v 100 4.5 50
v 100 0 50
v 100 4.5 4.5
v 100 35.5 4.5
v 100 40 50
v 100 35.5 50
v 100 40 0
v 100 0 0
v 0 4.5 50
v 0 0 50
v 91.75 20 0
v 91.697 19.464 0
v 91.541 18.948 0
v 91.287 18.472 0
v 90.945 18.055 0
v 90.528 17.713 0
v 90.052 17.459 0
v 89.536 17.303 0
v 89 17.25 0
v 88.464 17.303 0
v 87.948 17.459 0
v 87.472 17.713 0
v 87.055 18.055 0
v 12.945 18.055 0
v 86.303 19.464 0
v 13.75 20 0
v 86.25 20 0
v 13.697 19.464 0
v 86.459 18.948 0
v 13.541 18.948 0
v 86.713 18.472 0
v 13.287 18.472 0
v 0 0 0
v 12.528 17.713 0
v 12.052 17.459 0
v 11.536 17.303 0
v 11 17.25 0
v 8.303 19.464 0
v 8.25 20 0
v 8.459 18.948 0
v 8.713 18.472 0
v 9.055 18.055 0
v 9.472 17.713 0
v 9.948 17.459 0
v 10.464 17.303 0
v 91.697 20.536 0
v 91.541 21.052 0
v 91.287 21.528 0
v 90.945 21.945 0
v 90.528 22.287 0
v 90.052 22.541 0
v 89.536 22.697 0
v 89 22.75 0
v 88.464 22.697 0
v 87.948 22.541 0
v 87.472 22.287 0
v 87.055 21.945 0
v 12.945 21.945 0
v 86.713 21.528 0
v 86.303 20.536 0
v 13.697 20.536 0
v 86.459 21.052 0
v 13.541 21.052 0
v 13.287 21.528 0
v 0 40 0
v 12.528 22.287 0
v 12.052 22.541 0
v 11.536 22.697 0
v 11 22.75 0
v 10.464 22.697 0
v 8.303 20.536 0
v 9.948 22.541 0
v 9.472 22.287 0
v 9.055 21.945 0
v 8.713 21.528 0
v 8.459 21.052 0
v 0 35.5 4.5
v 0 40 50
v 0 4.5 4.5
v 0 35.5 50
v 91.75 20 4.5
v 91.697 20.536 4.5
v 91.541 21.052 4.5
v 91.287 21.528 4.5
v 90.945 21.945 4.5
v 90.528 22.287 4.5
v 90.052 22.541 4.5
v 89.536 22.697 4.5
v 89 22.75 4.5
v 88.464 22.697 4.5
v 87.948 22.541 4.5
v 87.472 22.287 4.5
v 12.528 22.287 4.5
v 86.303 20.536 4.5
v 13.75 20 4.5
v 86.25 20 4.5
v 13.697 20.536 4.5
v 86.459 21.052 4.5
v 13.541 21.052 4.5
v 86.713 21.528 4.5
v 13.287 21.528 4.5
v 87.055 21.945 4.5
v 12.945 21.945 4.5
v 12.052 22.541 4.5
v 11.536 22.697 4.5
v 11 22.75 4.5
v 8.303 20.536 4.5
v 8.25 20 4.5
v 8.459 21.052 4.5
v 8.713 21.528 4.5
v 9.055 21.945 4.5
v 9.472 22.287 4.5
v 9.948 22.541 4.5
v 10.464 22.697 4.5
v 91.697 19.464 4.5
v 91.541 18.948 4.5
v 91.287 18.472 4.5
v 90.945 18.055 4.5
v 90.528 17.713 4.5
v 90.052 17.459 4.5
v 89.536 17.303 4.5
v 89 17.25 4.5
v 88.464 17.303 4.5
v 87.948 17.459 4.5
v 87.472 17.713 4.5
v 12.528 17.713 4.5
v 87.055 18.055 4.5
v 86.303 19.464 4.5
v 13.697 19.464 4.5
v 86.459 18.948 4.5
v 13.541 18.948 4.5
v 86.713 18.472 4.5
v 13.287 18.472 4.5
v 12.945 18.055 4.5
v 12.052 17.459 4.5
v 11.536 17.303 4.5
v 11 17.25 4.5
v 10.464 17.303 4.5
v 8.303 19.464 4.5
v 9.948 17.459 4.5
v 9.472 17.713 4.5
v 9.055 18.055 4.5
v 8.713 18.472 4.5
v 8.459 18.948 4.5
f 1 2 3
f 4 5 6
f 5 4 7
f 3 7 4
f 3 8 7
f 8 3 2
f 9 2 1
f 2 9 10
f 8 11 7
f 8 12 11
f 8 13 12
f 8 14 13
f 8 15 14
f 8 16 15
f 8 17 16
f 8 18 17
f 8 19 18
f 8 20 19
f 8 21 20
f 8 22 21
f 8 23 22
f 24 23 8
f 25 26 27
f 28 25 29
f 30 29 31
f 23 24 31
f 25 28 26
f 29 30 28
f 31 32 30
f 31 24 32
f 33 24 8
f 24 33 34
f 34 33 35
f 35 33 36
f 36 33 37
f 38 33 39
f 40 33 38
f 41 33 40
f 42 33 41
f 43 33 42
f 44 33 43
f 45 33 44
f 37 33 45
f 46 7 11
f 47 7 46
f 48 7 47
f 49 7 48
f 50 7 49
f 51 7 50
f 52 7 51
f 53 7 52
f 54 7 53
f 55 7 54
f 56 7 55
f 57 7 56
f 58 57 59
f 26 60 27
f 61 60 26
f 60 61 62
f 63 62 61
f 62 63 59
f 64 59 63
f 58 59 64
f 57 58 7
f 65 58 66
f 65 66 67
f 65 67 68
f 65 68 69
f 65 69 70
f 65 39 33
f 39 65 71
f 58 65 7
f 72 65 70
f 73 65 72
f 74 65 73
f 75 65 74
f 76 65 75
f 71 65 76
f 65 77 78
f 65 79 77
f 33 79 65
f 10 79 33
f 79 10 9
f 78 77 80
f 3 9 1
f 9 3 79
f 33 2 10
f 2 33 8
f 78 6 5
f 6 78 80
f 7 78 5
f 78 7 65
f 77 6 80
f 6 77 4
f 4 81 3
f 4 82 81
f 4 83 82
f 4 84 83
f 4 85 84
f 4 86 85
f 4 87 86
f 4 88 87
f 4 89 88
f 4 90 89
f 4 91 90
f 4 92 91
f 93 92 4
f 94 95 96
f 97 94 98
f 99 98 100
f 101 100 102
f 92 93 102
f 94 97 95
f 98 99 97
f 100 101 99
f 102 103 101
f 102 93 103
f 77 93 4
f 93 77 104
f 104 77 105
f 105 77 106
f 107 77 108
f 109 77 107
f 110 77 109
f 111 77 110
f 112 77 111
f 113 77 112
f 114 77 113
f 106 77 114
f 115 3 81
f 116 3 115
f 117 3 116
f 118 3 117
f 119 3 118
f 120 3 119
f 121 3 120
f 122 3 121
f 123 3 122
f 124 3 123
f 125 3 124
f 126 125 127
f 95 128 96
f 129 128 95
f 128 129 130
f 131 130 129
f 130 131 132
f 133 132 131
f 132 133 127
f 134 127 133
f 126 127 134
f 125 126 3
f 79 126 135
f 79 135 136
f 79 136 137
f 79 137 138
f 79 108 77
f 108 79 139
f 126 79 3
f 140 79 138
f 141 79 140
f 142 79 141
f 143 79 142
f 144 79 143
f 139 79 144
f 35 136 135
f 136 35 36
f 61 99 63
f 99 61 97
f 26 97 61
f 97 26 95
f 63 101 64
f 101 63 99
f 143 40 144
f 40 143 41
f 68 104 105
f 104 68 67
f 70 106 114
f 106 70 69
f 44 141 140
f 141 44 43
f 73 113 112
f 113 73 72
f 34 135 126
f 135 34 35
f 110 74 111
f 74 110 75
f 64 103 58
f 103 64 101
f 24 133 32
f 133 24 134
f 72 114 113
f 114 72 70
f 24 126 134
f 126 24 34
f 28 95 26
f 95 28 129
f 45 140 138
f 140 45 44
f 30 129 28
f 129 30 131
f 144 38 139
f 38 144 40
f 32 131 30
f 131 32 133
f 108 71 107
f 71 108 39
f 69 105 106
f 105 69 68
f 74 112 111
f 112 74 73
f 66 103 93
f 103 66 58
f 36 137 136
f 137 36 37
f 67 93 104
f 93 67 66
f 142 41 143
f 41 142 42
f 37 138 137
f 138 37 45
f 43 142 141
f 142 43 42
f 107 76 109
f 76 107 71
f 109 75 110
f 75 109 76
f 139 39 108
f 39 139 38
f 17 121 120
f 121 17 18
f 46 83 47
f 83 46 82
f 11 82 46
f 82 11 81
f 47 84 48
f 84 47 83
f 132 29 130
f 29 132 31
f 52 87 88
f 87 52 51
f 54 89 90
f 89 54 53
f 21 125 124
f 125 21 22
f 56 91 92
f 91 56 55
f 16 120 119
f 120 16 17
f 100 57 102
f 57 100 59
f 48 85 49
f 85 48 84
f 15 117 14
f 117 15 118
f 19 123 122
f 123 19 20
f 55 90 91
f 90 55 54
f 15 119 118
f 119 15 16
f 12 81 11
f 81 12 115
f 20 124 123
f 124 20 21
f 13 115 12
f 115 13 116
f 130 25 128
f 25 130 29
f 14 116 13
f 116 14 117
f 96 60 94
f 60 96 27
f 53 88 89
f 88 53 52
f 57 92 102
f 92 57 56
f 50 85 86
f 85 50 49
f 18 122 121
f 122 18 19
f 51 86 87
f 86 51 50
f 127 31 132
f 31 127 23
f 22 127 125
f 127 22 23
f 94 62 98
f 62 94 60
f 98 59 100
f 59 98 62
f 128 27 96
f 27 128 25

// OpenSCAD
$fn = 32;

// ----------------------------------------------------------------------
// U-bracket: 100 x 40 x 50 mm
// ----------------------------------------------------------------------

// --- parameters (mm) ---
rail_len = 100;           // outer length, X
jaw_w = 40;               // outer width, Y
jaw_h = 50;               // upright height, Z
web_t = 4.5;              // wall thickness
hole_d = 5.5;             // clearance for M5

module hole_z(px, py) {
  translate([px, py, -2.5]) cylinder(h = web_t + 5, d = hole_d);
}
module hole_y_pz(pz) {
  /* through both uprights along Y */
  translate([0, -2.5, pz]) rotate([-90, 0, 0]) cylinder(h = jaw_w + 5, d = hole_d);
}

module base() {
  cube([rail_len, jaw_w, web_t]);
}

module uprights() {
  cube([rail_len, web_t, jaw_h]);
  translate([0, jaw_w - web_t, 0]) cube([rail_len, web_t, jaw_h]);
}

difference() {
  union() {
    base();
    uprights();
  }
  hole_z(11, 20);
  hole_z(89, 20);
}
